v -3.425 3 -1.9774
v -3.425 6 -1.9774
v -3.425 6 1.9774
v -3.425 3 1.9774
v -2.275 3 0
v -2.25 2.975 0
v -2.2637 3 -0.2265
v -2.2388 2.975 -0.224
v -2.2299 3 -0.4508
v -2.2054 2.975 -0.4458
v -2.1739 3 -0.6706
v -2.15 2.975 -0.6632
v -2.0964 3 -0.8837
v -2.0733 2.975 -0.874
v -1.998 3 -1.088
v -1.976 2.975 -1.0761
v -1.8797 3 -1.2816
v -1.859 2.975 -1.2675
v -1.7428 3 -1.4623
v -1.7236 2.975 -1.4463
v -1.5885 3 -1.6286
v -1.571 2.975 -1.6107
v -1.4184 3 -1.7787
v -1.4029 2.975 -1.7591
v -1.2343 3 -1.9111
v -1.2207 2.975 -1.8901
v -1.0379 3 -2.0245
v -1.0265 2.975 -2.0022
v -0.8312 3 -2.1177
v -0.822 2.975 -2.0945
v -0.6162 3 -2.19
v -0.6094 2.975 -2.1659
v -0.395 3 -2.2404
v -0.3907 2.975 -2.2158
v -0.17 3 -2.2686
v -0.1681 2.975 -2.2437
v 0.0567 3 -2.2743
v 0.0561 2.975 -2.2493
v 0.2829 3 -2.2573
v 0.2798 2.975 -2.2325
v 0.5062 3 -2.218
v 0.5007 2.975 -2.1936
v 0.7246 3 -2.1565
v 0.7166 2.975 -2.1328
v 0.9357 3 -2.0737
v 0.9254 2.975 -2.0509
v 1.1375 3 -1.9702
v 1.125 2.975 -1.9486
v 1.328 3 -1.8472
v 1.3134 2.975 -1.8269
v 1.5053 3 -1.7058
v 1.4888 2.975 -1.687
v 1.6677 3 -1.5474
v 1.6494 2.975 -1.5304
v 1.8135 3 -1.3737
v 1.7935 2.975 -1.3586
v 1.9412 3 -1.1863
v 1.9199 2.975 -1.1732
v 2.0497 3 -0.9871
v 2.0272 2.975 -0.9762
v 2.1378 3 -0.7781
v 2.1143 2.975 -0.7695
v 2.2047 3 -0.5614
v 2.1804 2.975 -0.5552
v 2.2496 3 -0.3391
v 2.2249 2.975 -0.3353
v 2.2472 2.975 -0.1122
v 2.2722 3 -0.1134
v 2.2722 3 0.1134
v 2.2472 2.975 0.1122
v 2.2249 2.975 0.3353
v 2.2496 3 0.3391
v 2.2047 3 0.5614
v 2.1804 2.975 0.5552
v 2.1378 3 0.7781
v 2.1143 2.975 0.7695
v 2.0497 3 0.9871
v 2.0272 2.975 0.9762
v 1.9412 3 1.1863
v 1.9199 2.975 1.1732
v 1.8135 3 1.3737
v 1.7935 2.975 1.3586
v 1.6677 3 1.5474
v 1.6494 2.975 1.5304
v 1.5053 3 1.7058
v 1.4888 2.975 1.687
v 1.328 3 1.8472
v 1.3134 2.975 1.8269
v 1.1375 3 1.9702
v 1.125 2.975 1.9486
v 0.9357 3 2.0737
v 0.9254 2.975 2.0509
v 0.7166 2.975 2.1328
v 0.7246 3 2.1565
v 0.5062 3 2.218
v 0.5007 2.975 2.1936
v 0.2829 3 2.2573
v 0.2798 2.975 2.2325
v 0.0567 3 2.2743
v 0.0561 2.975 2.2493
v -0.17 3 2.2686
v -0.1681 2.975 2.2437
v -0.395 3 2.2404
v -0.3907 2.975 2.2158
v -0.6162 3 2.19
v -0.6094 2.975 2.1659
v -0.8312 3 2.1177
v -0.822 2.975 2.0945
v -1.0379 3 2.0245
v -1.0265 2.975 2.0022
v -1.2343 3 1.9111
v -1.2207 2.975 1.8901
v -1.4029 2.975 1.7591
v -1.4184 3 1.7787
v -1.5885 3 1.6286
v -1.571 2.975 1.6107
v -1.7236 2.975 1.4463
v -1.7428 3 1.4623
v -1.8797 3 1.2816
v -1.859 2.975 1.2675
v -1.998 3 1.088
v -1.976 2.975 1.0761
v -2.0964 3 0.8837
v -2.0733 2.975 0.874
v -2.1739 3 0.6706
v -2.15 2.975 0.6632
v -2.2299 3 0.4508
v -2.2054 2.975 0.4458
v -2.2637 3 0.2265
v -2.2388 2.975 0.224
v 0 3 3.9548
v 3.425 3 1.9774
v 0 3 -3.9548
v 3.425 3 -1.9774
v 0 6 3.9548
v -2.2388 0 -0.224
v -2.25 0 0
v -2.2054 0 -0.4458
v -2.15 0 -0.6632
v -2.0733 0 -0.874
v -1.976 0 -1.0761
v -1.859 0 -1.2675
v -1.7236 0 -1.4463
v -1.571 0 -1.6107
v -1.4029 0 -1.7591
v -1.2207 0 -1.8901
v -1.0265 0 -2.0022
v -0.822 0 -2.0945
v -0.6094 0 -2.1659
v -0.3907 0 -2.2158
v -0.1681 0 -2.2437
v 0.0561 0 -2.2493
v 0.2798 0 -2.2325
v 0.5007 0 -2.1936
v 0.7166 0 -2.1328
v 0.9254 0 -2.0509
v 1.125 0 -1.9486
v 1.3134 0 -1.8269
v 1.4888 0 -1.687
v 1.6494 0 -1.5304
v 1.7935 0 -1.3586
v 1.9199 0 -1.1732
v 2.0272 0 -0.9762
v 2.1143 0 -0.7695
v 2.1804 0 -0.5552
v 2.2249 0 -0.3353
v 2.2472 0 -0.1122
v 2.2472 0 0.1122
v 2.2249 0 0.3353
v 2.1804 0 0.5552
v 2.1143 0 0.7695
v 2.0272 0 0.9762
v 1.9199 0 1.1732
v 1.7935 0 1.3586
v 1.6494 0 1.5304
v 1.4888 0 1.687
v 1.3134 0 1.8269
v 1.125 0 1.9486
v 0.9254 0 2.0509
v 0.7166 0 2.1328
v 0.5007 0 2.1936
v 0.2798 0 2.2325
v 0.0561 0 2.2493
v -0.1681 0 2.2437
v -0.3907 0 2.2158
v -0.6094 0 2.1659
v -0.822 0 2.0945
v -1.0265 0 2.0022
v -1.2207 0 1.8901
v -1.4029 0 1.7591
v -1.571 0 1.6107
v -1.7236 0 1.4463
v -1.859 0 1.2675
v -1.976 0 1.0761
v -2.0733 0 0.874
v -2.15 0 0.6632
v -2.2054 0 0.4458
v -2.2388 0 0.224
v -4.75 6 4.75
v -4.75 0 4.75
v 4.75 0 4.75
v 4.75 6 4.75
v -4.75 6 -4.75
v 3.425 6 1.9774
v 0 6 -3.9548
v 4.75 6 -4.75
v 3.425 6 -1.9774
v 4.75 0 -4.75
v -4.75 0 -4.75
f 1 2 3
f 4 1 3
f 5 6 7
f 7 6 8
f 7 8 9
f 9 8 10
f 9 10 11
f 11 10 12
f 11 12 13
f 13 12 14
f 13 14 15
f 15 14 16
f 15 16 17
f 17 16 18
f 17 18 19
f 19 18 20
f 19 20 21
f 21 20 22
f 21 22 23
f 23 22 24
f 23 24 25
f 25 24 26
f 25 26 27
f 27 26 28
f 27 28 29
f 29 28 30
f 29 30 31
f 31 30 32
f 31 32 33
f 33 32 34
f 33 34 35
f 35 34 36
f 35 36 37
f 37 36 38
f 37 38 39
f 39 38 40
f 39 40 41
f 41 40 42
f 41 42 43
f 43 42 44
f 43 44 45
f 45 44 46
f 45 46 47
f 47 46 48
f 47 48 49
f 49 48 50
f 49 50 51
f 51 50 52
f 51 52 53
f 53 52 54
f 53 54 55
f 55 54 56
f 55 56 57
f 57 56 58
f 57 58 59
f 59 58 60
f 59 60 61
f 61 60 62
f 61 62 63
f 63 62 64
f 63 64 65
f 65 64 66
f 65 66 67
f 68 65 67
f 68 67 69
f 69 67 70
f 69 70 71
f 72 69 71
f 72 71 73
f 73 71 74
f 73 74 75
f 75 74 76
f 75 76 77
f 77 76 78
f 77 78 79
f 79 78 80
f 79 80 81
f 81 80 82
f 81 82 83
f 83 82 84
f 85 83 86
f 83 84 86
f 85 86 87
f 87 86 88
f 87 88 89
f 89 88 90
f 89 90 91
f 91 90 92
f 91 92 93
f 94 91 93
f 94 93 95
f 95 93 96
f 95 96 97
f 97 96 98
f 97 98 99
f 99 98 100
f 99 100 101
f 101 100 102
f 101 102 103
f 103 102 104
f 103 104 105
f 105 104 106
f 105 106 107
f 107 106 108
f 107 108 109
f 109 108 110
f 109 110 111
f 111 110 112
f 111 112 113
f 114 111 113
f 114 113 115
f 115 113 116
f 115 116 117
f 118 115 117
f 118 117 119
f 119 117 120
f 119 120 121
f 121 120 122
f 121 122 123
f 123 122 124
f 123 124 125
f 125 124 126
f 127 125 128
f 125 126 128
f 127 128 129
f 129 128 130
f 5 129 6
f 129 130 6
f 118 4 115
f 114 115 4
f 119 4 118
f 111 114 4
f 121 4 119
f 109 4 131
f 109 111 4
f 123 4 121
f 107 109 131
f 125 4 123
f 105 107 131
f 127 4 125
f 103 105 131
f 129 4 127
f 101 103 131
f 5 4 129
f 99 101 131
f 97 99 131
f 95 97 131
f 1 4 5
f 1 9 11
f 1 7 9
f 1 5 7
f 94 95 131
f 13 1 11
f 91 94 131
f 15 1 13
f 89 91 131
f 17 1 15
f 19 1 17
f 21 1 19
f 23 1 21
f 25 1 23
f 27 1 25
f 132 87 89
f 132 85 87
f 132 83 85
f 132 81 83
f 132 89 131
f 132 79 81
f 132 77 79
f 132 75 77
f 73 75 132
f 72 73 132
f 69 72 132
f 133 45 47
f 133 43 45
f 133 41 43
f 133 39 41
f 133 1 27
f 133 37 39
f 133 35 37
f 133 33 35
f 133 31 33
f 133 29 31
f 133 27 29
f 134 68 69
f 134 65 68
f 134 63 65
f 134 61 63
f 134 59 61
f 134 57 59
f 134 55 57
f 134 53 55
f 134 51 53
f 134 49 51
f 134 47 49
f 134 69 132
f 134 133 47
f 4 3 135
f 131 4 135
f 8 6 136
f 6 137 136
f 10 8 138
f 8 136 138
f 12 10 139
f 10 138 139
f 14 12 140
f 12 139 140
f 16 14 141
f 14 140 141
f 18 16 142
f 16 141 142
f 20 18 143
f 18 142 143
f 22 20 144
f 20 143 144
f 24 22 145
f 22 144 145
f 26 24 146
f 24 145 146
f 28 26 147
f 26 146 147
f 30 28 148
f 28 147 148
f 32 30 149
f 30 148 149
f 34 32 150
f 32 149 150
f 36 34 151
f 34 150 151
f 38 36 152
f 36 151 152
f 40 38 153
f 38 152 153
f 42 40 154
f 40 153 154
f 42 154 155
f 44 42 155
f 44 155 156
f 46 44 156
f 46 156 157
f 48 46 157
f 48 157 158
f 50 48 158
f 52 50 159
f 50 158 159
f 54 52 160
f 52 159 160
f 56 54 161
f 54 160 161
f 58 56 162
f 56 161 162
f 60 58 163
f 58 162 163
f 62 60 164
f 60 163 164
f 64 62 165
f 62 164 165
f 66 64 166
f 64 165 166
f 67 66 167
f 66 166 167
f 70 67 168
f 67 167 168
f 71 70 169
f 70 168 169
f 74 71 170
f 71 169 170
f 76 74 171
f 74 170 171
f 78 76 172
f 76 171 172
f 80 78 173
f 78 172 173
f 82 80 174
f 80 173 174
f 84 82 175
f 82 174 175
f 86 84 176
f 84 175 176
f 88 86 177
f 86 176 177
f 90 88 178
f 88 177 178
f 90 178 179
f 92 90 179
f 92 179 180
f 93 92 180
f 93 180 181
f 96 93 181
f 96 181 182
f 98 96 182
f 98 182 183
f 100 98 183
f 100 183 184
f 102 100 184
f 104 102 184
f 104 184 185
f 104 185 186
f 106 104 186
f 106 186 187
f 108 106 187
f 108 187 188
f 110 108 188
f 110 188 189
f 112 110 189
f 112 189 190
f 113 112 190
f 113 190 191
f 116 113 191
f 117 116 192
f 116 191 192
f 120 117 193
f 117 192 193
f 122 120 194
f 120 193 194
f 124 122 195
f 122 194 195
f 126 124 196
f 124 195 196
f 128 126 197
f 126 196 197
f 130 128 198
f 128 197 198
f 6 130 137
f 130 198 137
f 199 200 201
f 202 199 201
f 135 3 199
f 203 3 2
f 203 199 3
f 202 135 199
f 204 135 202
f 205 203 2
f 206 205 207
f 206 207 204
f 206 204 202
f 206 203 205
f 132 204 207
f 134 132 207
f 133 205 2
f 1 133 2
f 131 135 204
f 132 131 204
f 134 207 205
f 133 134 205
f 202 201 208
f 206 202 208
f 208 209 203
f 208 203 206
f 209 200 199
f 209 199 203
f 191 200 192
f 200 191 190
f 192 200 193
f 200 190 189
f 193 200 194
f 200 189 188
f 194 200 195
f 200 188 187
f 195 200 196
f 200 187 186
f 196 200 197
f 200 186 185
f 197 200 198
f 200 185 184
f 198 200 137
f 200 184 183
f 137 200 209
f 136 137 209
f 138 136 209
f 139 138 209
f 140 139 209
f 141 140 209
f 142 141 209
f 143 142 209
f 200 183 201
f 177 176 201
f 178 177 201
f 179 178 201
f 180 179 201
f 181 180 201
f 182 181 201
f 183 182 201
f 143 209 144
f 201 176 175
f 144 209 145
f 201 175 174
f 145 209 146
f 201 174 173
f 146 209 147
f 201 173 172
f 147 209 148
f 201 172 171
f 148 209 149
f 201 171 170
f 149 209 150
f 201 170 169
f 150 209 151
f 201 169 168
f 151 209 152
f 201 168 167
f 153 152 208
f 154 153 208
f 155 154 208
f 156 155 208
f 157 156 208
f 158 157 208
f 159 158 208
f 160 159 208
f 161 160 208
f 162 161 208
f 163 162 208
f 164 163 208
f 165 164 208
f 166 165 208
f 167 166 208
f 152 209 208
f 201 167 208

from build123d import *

# Parameters (mm, degrees)
SKETCH1_W                      = 9.5
SKETCH1_H                      = 9.5
BOSS_EXTRUDE1_DEPTH            = 6
CUT_EXTRUDE1_DEPTH             = 3
M4_CLEARANCE_HOLE1_D           = 4.5
M4_CLEARANCE_HOLE1_CSINK_D     = 4.55
M4_CLEARANCE_HOLE1_CSINK_ANGLE = 90


with BuildPart() as part:
    # Sketch1 → Boss-Extrude1 (new body)
    with BuildSketch(Plane(origin=(0, 0, 0), x_dir=(1, 0, 0), z_dir=(0, 1, 0))):
        Rectangle(SKETCH1_W, SKETCH1_H)
    extrude(amount=BOSS_EXTRUDE1_DEPTH)

    # Sketch2 → Cut-Extrude1 (cut)
    with BuildSketch(Plane(origin=(0, 6, 0), x_dir=(1, 0, 0), z_dir=(0, 1, 0))):
        Polygon((0, -3.954849344), (3.425, -1.977424672), (3.425, 1.977424672), (0, 3.954849344), (-3.425, 1.977424672), (-3.425, -1.977424672), align=None)
    extrude(amount=-CUT_EXTRUDE1_DEPTH, mode=Mode.SUBTRACT)

    # M4 Clearance Hole1 (through all)
    with Locations(Plane(origin=(0, 3, 0), x_dir=(1, 0, 0), z_dir=(0, 1, 0))):
        with Locations((0, 0)):
            CounterSinkHole(M4_CLEARANCE_HOLE1_D / 2, M4_CLEARANCE_HOLE1_CSINK_D / 2, counter_sink_angle=M4_CLEARANCE_HOLE1_CSINK_ANGLE)


solid = part.part
